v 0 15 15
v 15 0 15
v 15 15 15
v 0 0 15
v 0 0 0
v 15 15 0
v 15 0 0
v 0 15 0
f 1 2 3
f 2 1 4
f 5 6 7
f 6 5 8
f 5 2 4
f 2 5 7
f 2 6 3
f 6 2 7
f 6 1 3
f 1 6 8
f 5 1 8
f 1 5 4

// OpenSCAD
$fn=25;

cube([15, 15, 15]);

// module myBox(width=110, depth=65, height=30, thickness = 2){
//     // external dimensions
//     // width=110; // x axis
//     // depth=65;  // y axis
//     // height=30; // z axis
//     aWalls=[
//         [0,0], [width,0], [width,depth], [0,depth],
//         [0+thickness,0+thickness], [width-thickness, 0+thickness], [width-thickness, depth-thickness], [0+thickness, depth-thickness]
//     ];
//     bWalls=[
//         [0, 1, 2, 3], // external borders
//         [4, 5, 6, 7]  // internal borders
//     ];
    
//     aBotom=[[0,0], [width,0], [width, depth], [0,depth]];
//     bBottom=[[0, 1, 2, 3]];

//     union(){
//         color([0.8,0.5, 1])
//             linear_extrude(height = height){
//                 polygon(aWalls,bWalls);
//             };
        
        
//         color([1, 0.5, 0.8])
//             linear_extrude(height = thickness){
//                 polygon(aBotom, bBottom);
//             };
//     }
// }

// myBox(width=110, depth=65, height=30, thickness = 3);


// translate([0, 0, -2.5]) {

//     difference(){
//         translate([-5, -5, 0]) {
//             cube([10, 10, 1]);
//         };

//         translate([-2.5, -2.5, -0.5]) {
//             color([0.8, 0.8, 0.5]) cube([5, 5, 2]);
//         };
//     }

//     difference(){
//         difference(){
//             translate([0, 0, 5]) {
//                 sphere(d = 2);
//             };

//             translate([0, 0, 2.01]) {
//                 cylinder(d1 = 4, d2 = 0, h = 5);
//             };
//         }

//         translate([0, 0, 5]) {
//             rotate([15,15,0]){
//                 rotate_extrude(convexity = 10)
//                 translate([2, 0, 0])
//                 circle(r = 1.1);
//             }
//         }
//     }
// };



// minkowski(){
//     cube([10, 10, 1]);
//     cylinder(r=1, h=1);
// }

// difference() {
//     circle(10);
//     square(15);
// }
